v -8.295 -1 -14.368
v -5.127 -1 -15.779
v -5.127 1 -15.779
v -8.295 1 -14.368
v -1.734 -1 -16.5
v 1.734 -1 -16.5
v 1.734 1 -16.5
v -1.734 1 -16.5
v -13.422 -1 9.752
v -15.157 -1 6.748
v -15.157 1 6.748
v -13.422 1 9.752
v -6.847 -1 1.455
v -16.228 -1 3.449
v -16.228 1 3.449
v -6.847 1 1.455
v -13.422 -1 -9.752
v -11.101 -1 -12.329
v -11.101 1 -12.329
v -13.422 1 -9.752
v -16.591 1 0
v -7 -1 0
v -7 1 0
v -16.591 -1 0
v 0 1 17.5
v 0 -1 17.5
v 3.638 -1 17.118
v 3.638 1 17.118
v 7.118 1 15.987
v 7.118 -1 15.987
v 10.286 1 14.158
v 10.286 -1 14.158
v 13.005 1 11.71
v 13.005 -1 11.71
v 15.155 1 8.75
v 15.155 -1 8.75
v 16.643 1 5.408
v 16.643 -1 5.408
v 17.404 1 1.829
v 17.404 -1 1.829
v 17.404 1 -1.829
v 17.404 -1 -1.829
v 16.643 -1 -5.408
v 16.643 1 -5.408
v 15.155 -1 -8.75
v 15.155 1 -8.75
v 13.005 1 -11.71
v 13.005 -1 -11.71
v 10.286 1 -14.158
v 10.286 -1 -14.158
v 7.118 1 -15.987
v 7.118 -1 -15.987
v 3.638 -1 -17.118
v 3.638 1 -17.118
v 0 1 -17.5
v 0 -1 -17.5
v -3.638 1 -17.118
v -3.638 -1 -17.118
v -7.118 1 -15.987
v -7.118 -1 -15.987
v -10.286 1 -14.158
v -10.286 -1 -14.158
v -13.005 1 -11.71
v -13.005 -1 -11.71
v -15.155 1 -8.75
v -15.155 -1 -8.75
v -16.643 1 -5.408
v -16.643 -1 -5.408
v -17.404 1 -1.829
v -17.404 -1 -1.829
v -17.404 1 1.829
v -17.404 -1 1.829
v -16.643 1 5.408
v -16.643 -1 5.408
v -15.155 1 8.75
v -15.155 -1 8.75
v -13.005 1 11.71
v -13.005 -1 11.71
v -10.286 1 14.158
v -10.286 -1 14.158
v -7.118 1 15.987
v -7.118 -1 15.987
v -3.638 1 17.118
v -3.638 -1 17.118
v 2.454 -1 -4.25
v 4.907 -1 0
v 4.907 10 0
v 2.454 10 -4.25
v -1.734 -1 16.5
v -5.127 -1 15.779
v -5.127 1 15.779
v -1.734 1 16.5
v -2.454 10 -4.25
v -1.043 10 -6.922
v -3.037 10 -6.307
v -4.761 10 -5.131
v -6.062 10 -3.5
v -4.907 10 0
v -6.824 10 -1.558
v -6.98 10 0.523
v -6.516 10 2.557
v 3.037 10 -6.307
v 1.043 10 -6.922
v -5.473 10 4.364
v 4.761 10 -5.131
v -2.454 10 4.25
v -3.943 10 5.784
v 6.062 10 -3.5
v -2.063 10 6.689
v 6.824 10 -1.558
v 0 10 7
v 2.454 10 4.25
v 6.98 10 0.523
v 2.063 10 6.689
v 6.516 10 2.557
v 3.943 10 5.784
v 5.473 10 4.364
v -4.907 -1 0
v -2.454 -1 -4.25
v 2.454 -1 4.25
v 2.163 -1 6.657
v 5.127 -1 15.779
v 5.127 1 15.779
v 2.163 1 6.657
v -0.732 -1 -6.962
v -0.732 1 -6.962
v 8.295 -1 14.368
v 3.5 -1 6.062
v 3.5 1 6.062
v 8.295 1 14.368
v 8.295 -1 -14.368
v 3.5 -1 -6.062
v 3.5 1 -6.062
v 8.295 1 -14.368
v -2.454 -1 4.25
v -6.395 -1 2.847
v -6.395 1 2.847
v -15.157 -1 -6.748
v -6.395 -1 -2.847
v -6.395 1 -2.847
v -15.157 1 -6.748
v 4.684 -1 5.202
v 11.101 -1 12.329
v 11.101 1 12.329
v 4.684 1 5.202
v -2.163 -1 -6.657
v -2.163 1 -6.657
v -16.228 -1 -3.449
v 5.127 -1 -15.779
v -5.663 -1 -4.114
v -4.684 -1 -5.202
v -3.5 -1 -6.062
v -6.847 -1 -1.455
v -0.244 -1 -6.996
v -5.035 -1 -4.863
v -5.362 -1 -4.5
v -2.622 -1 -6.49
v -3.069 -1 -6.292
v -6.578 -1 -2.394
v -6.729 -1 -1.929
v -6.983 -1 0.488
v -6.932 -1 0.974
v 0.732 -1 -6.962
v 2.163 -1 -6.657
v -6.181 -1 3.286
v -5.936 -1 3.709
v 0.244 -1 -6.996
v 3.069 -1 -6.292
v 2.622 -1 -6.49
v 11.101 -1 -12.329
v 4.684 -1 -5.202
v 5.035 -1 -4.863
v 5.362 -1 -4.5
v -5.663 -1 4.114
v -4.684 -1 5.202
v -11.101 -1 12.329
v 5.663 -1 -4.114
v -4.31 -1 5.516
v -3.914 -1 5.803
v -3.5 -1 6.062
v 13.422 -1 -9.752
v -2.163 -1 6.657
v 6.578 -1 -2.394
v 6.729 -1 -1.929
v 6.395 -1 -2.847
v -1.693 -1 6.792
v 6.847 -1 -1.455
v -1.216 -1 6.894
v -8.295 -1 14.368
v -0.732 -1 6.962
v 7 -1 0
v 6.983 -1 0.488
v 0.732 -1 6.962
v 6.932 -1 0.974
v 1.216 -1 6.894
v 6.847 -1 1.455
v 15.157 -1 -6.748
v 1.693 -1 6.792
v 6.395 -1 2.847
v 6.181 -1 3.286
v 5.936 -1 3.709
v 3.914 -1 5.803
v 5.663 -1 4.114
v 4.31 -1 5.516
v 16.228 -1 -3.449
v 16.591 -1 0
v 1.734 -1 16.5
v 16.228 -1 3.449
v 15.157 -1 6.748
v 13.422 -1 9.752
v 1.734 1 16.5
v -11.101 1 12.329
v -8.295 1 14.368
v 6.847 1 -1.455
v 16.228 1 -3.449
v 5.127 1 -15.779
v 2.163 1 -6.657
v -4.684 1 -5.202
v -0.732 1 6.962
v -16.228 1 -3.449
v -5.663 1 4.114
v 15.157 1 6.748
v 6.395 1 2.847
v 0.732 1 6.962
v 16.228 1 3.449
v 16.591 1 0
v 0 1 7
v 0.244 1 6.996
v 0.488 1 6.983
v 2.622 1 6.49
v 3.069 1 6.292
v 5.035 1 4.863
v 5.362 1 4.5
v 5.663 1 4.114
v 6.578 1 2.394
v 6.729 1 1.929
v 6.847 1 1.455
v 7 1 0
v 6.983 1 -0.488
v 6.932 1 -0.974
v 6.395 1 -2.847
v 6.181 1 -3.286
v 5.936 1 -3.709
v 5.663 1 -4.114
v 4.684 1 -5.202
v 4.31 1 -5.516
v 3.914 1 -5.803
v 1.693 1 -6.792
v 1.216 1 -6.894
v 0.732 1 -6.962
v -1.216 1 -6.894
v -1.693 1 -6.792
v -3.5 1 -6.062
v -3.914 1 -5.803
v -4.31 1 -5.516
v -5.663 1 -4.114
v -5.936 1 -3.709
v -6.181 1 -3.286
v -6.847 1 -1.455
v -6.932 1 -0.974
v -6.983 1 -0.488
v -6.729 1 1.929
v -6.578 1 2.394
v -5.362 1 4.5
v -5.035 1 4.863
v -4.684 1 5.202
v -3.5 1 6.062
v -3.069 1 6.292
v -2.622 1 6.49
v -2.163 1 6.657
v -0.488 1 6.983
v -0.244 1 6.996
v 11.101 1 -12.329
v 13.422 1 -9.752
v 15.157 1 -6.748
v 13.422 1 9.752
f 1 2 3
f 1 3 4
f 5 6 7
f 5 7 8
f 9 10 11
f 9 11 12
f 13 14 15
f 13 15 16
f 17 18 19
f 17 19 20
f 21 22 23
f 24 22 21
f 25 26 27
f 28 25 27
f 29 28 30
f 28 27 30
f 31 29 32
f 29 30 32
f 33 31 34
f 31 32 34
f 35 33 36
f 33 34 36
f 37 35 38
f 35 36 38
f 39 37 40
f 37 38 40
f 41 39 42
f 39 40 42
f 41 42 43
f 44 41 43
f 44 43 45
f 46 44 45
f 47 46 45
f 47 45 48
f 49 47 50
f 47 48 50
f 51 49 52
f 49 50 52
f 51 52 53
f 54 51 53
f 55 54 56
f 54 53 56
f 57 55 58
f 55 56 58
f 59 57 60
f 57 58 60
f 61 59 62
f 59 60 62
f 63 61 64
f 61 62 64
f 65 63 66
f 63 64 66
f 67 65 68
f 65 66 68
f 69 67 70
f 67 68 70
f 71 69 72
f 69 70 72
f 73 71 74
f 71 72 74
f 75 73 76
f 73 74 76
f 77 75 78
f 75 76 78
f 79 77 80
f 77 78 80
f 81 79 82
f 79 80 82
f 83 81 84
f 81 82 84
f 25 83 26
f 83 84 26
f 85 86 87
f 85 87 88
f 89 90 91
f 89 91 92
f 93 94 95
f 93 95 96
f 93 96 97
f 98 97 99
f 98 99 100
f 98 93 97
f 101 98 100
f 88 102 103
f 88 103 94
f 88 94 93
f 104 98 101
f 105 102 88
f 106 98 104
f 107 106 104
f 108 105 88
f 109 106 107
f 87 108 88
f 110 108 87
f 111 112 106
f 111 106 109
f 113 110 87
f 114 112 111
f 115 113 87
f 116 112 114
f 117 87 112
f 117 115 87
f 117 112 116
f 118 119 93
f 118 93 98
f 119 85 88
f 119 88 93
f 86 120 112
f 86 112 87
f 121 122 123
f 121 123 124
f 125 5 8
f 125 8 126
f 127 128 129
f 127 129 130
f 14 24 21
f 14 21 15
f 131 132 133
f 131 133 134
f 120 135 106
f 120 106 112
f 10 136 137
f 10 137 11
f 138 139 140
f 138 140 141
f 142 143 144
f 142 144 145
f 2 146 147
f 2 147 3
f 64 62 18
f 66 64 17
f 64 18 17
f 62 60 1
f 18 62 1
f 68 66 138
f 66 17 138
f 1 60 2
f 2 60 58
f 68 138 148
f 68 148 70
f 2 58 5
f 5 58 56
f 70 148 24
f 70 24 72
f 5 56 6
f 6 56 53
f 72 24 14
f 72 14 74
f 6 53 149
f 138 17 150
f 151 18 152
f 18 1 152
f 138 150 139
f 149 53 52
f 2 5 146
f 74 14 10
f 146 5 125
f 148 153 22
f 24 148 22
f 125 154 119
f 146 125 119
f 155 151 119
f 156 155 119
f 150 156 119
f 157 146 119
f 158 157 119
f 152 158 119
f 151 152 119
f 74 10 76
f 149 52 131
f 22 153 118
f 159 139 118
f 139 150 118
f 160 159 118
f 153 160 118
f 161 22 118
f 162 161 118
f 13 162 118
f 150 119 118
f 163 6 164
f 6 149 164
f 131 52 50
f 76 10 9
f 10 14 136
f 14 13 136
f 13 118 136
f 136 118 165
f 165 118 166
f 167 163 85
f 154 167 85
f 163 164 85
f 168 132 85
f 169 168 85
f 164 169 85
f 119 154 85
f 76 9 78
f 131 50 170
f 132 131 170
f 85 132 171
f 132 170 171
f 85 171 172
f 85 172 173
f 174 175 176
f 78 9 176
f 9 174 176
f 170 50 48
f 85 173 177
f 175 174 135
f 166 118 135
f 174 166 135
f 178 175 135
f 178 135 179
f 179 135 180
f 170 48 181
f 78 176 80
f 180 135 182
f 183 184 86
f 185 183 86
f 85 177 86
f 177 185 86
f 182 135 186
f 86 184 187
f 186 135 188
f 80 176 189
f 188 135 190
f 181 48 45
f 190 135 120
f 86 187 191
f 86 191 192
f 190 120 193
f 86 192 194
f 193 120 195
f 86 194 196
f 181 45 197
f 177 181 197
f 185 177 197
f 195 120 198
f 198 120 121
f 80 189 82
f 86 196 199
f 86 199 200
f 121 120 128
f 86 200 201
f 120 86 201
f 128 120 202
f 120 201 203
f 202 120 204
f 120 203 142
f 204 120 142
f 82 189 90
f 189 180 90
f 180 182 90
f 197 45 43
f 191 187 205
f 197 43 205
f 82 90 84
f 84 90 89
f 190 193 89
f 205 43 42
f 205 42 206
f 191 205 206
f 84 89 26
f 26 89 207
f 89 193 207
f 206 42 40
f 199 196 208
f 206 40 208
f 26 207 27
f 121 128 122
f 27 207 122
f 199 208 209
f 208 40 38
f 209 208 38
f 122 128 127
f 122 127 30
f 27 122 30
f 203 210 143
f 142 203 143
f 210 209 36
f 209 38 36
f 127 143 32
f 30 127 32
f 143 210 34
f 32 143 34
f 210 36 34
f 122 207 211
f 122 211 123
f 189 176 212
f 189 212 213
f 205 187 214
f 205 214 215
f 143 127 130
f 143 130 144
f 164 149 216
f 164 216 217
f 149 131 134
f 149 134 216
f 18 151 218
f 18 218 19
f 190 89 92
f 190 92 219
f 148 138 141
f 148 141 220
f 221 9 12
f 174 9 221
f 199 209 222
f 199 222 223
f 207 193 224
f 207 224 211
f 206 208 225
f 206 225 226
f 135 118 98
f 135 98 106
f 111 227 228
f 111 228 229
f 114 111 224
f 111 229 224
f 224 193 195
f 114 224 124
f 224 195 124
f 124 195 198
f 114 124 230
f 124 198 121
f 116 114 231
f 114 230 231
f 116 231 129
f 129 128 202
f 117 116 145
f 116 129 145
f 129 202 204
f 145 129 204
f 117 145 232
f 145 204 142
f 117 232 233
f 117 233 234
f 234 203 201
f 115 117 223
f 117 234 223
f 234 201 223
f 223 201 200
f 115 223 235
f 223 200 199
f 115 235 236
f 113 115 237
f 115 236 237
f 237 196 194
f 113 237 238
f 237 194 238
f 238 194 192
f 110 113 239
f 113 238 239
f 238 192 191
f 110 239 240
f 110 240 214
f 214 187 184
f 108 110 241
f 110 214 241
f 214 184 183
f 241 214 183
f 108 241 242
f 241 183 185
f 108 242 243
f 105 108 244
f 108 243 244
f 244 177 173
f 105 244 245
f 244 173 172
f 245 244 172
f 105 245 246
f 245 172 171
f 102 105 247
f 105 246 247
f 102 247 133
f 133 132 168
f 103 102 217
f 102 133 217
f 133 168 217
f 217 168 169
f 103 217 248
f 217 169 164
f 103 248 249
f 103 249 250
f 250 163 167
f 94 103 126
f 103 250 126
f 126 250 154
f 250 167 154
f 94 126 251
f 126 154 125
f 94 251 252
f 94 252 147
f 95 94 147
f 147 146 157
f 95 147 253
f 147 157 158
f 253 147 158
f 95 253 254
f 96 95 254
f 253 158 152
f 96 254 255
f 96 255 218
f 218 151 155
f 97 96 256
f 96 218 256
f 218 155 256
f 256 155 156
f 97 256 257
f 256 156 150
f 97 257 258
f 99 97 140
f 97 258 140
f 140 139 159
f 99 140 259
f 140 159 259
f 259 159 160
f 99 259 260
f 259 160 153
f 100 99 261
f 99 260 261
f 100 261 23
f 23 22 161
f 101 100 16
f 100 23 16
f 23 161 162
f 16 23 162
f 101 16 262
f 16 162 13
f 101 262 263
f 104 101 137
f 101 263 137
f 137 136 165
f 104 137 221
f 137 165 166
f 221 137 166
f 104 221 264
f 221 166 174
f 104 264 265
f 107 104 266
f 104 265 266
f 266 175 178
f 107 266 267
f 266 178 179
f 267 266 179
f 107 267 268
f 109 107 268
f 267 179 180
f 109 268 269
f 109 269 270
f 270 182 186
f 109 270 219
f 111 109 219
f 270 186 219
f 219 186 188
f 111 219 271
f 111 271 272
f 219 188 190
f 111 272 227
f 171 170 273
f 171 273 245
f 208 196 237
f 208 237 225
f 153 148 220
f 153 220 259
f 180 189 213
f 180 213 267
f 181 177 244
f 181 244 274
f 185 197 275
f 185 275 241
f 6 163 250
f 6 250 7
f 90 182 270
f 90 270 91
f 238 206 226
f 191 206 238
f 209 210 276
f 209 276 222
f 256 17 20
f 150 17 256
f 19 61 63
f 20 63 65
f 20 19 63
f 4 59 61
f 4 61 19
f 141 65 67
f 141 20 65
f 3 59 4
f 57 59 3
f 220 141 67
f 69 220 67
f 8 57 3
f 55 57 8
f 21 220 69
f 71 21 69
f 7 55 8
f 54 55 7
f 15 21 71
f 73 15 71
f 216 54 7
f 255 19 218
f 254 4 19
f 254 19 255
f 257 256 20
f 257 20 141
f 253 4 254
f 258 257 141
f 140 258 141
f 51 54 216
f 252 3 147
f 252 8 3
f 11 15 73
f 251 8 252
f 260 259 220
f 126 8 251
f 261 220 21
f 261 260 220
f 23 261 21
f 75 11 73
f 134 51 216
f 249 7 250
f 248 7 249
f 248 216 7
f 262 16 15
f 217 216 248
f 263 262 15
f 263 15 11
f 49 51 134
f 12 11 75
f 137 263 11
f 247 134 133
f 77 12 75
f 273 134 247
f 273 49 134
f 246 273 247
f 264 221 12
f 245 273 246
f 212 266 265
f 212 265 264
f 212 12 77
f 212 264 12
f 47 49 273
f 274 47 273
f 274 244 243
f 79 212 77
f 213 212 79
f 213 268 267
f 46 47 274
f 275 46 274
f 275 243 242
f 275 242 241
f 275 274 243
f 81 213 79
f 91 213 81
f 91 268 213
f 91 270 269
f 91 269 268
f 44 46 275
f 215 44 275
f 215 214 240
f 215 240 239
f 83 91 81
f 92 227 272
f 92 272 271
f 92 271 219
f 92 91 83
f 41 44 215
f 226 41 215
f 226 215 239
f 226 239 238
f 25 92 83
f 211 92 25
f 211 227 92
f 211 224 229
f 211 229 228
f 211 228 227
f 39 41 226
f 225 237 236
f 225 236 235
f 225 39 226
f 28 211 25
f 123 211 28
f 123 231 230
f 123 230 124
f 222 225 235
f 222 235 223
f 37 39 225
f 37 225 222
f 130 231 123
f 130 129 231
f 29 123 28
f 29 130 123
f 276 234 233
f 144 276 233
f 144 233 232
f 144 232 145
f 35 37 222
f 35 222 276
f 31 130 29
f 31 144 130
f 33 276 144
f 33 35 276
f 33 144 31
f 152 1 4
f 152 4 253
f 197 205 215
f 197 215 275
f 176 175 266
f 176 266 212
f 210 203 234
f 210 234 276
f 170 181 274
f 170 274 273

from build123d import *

# Parameters (mm, degrees)
BOSS_EXTRUDE1_DEPTH      = 1
BOSS_EXTRUDE1_DEPTH_BACK = 1
SKETCH1_R                = 17.5
BOSS_EXTRUDE2_START      = -1
SKETCH2_R                = 7
BOSS_EXTRUDE2_DEPTH      = 11


with BuildPart() as part:
    # Sketch1 → Boss-Extrude1 (new, two sides: drawn at the far end of the back side and taken through both)
    with BuildSketch(Plane(origin=(0, 0, 0), x_dir=(1, 0, 0), z_dir=(0, 1, 0)).offset(-BOSS_EXTRUDE1_DEPTH_BACK)):
        with Locations(Location((0, 0, 0), (0, 0, 270))):
            Circle(SKETCH1_R)
        Polygon((3.267901909, 5.66017214), (8.295443306, 14.368129278), (5.126865915, 15.778870824), (2.019674451, 6.21591881), align=None, mode=Mode.SUBTRACT)
        Polygon((0.683177529, 6.5), (1.734219882, 16.5), (-1.734219882, 16.5), (-0.683177529, 6.5), align=None, mode=Mode.SUBTRACT)
        Polygon((5.28757636, 3.841649096), (13.422309222, 9.751878473), (11.101470019, 12.329431536), (4.373306371, 4.857048787), align=None, mode=Mode.SUBTRACT)
        Polygon((6.392980823, 1.358870022), (16.228335934, 3.449439288), (15.156529103, 6.748121527), (5.970753889, 2.658350904), align=None, mode=Mode.SUBTRACT)
        Polygon((6.392980823, -1.358870022), (16.228335934, -3.449439288), (16.590886613, 0), (6.535803817, 0), align=None, mode=Mode.SUBTRACT)
        Polygon((5.28757636, -3.841649096), (13.422309222, -9.751878473), (15.156529103, -6.748121527), (5.970753889, -2.658350904), align=None, mode=Mode.SUBTRACT)
        Polygon((3.267901909, -5.66017214), (8.295443306, -14.368129278), (11.101470019, -12.329431536), (4.373306371, -4.857048787), align=None, mode=Mode.SUBTRACT)
        Polygon((0.683177529, -6.5), (1.734219882, -16.5), (5.126865915, -15.778870824), (2.019674451, -6.21591881), align=None, mode=Mode.SUBTRACT)
        Polygon((-2.019674451, -6.21591881), (-5.126865915, -15.778870824), (-1.734219882, -16.5), (-0.683177529, -6.5), align=None, mode=Mode.SUBTRACT)
        Polygon((-4.373306371, -4.857048787), (-11.101470019, -12.329431536), (-8.295443306, -14.368129278), (-3.267901909, -5.66017214), align=None, mode=Mode.SUBTRACT)
        Polygon((-5.970753889, -2.658350904), (-15.156529103, -6.748121527), (-13.422309222, -9.751878473), (-5.28757636, -3.841649096), align=None, mode=Mode.SUBTRACT)
        Polygon((-6.535803817, 0), (-16.590886613, 0), (-16.228335934, -3.449439288), (-6.392980823, -1.358870022), align=None, mode=Mode.SUBTRACT)
        Polygon((-5.970753889, 2.658350904), (-15.156529103, 6.748121527), (-16.228335934, 3.449439288), (-6.392980823, 1.358870022), align=None, mode=Mode.SUBTRACT)
        Polygon((-4.373306371, 4.857048787), (-11.101470019, 12.329431536), (-13.422309222, 9.751878473), (-5.28757636, 3.841649096), align=None, mode=Mode.SUBTRACT)
        Polygon((-2.019674451, 6.21591881), (-5.126865915, 15.778870824), (-8.295443306, 14.368129278), (-3.267901909, 5.66017214), align=None, mode=Mode.SUBTRACT)
        Polygon((4.907477288, 0), (2.453738644, 4.25), (-2.453738644, 4.25), (-4.907477288, 0), (-2.453738644, -4.25), (2.453738644, -4.25), align=None, mode=Mode.SUBTRACT)
    extrude(amount=BOSS_EXTRUDE1_DEPTH + BOSS_EXTRUDE1_DEPTH_BACK)

    # Sketch2 → Boss-Extrude2 (add)
    with BuildSketch(Plane(origin=(0, 0, 0), x_dir=(1, 0, 0), z_dir=(0, 1, 0)).offset(BOSS_EXTRUDE2_START)):
        with Locations(Location((0, 0, 0), (0, 0, 270))):
            Circle(SKETCH2_R)
        Polygon((4.907477288, 0), (2.453738644, 4.25), (-2.453738644, 4.25), (-4.907477288, 0), (-2.453738644, -4.25), (2.453738644, -4.25), align=None, mode=Mode.SUBTRACT)
    extrude(amount=BOSS_EXTRUDE2_DEPTH)


solid = part.part
